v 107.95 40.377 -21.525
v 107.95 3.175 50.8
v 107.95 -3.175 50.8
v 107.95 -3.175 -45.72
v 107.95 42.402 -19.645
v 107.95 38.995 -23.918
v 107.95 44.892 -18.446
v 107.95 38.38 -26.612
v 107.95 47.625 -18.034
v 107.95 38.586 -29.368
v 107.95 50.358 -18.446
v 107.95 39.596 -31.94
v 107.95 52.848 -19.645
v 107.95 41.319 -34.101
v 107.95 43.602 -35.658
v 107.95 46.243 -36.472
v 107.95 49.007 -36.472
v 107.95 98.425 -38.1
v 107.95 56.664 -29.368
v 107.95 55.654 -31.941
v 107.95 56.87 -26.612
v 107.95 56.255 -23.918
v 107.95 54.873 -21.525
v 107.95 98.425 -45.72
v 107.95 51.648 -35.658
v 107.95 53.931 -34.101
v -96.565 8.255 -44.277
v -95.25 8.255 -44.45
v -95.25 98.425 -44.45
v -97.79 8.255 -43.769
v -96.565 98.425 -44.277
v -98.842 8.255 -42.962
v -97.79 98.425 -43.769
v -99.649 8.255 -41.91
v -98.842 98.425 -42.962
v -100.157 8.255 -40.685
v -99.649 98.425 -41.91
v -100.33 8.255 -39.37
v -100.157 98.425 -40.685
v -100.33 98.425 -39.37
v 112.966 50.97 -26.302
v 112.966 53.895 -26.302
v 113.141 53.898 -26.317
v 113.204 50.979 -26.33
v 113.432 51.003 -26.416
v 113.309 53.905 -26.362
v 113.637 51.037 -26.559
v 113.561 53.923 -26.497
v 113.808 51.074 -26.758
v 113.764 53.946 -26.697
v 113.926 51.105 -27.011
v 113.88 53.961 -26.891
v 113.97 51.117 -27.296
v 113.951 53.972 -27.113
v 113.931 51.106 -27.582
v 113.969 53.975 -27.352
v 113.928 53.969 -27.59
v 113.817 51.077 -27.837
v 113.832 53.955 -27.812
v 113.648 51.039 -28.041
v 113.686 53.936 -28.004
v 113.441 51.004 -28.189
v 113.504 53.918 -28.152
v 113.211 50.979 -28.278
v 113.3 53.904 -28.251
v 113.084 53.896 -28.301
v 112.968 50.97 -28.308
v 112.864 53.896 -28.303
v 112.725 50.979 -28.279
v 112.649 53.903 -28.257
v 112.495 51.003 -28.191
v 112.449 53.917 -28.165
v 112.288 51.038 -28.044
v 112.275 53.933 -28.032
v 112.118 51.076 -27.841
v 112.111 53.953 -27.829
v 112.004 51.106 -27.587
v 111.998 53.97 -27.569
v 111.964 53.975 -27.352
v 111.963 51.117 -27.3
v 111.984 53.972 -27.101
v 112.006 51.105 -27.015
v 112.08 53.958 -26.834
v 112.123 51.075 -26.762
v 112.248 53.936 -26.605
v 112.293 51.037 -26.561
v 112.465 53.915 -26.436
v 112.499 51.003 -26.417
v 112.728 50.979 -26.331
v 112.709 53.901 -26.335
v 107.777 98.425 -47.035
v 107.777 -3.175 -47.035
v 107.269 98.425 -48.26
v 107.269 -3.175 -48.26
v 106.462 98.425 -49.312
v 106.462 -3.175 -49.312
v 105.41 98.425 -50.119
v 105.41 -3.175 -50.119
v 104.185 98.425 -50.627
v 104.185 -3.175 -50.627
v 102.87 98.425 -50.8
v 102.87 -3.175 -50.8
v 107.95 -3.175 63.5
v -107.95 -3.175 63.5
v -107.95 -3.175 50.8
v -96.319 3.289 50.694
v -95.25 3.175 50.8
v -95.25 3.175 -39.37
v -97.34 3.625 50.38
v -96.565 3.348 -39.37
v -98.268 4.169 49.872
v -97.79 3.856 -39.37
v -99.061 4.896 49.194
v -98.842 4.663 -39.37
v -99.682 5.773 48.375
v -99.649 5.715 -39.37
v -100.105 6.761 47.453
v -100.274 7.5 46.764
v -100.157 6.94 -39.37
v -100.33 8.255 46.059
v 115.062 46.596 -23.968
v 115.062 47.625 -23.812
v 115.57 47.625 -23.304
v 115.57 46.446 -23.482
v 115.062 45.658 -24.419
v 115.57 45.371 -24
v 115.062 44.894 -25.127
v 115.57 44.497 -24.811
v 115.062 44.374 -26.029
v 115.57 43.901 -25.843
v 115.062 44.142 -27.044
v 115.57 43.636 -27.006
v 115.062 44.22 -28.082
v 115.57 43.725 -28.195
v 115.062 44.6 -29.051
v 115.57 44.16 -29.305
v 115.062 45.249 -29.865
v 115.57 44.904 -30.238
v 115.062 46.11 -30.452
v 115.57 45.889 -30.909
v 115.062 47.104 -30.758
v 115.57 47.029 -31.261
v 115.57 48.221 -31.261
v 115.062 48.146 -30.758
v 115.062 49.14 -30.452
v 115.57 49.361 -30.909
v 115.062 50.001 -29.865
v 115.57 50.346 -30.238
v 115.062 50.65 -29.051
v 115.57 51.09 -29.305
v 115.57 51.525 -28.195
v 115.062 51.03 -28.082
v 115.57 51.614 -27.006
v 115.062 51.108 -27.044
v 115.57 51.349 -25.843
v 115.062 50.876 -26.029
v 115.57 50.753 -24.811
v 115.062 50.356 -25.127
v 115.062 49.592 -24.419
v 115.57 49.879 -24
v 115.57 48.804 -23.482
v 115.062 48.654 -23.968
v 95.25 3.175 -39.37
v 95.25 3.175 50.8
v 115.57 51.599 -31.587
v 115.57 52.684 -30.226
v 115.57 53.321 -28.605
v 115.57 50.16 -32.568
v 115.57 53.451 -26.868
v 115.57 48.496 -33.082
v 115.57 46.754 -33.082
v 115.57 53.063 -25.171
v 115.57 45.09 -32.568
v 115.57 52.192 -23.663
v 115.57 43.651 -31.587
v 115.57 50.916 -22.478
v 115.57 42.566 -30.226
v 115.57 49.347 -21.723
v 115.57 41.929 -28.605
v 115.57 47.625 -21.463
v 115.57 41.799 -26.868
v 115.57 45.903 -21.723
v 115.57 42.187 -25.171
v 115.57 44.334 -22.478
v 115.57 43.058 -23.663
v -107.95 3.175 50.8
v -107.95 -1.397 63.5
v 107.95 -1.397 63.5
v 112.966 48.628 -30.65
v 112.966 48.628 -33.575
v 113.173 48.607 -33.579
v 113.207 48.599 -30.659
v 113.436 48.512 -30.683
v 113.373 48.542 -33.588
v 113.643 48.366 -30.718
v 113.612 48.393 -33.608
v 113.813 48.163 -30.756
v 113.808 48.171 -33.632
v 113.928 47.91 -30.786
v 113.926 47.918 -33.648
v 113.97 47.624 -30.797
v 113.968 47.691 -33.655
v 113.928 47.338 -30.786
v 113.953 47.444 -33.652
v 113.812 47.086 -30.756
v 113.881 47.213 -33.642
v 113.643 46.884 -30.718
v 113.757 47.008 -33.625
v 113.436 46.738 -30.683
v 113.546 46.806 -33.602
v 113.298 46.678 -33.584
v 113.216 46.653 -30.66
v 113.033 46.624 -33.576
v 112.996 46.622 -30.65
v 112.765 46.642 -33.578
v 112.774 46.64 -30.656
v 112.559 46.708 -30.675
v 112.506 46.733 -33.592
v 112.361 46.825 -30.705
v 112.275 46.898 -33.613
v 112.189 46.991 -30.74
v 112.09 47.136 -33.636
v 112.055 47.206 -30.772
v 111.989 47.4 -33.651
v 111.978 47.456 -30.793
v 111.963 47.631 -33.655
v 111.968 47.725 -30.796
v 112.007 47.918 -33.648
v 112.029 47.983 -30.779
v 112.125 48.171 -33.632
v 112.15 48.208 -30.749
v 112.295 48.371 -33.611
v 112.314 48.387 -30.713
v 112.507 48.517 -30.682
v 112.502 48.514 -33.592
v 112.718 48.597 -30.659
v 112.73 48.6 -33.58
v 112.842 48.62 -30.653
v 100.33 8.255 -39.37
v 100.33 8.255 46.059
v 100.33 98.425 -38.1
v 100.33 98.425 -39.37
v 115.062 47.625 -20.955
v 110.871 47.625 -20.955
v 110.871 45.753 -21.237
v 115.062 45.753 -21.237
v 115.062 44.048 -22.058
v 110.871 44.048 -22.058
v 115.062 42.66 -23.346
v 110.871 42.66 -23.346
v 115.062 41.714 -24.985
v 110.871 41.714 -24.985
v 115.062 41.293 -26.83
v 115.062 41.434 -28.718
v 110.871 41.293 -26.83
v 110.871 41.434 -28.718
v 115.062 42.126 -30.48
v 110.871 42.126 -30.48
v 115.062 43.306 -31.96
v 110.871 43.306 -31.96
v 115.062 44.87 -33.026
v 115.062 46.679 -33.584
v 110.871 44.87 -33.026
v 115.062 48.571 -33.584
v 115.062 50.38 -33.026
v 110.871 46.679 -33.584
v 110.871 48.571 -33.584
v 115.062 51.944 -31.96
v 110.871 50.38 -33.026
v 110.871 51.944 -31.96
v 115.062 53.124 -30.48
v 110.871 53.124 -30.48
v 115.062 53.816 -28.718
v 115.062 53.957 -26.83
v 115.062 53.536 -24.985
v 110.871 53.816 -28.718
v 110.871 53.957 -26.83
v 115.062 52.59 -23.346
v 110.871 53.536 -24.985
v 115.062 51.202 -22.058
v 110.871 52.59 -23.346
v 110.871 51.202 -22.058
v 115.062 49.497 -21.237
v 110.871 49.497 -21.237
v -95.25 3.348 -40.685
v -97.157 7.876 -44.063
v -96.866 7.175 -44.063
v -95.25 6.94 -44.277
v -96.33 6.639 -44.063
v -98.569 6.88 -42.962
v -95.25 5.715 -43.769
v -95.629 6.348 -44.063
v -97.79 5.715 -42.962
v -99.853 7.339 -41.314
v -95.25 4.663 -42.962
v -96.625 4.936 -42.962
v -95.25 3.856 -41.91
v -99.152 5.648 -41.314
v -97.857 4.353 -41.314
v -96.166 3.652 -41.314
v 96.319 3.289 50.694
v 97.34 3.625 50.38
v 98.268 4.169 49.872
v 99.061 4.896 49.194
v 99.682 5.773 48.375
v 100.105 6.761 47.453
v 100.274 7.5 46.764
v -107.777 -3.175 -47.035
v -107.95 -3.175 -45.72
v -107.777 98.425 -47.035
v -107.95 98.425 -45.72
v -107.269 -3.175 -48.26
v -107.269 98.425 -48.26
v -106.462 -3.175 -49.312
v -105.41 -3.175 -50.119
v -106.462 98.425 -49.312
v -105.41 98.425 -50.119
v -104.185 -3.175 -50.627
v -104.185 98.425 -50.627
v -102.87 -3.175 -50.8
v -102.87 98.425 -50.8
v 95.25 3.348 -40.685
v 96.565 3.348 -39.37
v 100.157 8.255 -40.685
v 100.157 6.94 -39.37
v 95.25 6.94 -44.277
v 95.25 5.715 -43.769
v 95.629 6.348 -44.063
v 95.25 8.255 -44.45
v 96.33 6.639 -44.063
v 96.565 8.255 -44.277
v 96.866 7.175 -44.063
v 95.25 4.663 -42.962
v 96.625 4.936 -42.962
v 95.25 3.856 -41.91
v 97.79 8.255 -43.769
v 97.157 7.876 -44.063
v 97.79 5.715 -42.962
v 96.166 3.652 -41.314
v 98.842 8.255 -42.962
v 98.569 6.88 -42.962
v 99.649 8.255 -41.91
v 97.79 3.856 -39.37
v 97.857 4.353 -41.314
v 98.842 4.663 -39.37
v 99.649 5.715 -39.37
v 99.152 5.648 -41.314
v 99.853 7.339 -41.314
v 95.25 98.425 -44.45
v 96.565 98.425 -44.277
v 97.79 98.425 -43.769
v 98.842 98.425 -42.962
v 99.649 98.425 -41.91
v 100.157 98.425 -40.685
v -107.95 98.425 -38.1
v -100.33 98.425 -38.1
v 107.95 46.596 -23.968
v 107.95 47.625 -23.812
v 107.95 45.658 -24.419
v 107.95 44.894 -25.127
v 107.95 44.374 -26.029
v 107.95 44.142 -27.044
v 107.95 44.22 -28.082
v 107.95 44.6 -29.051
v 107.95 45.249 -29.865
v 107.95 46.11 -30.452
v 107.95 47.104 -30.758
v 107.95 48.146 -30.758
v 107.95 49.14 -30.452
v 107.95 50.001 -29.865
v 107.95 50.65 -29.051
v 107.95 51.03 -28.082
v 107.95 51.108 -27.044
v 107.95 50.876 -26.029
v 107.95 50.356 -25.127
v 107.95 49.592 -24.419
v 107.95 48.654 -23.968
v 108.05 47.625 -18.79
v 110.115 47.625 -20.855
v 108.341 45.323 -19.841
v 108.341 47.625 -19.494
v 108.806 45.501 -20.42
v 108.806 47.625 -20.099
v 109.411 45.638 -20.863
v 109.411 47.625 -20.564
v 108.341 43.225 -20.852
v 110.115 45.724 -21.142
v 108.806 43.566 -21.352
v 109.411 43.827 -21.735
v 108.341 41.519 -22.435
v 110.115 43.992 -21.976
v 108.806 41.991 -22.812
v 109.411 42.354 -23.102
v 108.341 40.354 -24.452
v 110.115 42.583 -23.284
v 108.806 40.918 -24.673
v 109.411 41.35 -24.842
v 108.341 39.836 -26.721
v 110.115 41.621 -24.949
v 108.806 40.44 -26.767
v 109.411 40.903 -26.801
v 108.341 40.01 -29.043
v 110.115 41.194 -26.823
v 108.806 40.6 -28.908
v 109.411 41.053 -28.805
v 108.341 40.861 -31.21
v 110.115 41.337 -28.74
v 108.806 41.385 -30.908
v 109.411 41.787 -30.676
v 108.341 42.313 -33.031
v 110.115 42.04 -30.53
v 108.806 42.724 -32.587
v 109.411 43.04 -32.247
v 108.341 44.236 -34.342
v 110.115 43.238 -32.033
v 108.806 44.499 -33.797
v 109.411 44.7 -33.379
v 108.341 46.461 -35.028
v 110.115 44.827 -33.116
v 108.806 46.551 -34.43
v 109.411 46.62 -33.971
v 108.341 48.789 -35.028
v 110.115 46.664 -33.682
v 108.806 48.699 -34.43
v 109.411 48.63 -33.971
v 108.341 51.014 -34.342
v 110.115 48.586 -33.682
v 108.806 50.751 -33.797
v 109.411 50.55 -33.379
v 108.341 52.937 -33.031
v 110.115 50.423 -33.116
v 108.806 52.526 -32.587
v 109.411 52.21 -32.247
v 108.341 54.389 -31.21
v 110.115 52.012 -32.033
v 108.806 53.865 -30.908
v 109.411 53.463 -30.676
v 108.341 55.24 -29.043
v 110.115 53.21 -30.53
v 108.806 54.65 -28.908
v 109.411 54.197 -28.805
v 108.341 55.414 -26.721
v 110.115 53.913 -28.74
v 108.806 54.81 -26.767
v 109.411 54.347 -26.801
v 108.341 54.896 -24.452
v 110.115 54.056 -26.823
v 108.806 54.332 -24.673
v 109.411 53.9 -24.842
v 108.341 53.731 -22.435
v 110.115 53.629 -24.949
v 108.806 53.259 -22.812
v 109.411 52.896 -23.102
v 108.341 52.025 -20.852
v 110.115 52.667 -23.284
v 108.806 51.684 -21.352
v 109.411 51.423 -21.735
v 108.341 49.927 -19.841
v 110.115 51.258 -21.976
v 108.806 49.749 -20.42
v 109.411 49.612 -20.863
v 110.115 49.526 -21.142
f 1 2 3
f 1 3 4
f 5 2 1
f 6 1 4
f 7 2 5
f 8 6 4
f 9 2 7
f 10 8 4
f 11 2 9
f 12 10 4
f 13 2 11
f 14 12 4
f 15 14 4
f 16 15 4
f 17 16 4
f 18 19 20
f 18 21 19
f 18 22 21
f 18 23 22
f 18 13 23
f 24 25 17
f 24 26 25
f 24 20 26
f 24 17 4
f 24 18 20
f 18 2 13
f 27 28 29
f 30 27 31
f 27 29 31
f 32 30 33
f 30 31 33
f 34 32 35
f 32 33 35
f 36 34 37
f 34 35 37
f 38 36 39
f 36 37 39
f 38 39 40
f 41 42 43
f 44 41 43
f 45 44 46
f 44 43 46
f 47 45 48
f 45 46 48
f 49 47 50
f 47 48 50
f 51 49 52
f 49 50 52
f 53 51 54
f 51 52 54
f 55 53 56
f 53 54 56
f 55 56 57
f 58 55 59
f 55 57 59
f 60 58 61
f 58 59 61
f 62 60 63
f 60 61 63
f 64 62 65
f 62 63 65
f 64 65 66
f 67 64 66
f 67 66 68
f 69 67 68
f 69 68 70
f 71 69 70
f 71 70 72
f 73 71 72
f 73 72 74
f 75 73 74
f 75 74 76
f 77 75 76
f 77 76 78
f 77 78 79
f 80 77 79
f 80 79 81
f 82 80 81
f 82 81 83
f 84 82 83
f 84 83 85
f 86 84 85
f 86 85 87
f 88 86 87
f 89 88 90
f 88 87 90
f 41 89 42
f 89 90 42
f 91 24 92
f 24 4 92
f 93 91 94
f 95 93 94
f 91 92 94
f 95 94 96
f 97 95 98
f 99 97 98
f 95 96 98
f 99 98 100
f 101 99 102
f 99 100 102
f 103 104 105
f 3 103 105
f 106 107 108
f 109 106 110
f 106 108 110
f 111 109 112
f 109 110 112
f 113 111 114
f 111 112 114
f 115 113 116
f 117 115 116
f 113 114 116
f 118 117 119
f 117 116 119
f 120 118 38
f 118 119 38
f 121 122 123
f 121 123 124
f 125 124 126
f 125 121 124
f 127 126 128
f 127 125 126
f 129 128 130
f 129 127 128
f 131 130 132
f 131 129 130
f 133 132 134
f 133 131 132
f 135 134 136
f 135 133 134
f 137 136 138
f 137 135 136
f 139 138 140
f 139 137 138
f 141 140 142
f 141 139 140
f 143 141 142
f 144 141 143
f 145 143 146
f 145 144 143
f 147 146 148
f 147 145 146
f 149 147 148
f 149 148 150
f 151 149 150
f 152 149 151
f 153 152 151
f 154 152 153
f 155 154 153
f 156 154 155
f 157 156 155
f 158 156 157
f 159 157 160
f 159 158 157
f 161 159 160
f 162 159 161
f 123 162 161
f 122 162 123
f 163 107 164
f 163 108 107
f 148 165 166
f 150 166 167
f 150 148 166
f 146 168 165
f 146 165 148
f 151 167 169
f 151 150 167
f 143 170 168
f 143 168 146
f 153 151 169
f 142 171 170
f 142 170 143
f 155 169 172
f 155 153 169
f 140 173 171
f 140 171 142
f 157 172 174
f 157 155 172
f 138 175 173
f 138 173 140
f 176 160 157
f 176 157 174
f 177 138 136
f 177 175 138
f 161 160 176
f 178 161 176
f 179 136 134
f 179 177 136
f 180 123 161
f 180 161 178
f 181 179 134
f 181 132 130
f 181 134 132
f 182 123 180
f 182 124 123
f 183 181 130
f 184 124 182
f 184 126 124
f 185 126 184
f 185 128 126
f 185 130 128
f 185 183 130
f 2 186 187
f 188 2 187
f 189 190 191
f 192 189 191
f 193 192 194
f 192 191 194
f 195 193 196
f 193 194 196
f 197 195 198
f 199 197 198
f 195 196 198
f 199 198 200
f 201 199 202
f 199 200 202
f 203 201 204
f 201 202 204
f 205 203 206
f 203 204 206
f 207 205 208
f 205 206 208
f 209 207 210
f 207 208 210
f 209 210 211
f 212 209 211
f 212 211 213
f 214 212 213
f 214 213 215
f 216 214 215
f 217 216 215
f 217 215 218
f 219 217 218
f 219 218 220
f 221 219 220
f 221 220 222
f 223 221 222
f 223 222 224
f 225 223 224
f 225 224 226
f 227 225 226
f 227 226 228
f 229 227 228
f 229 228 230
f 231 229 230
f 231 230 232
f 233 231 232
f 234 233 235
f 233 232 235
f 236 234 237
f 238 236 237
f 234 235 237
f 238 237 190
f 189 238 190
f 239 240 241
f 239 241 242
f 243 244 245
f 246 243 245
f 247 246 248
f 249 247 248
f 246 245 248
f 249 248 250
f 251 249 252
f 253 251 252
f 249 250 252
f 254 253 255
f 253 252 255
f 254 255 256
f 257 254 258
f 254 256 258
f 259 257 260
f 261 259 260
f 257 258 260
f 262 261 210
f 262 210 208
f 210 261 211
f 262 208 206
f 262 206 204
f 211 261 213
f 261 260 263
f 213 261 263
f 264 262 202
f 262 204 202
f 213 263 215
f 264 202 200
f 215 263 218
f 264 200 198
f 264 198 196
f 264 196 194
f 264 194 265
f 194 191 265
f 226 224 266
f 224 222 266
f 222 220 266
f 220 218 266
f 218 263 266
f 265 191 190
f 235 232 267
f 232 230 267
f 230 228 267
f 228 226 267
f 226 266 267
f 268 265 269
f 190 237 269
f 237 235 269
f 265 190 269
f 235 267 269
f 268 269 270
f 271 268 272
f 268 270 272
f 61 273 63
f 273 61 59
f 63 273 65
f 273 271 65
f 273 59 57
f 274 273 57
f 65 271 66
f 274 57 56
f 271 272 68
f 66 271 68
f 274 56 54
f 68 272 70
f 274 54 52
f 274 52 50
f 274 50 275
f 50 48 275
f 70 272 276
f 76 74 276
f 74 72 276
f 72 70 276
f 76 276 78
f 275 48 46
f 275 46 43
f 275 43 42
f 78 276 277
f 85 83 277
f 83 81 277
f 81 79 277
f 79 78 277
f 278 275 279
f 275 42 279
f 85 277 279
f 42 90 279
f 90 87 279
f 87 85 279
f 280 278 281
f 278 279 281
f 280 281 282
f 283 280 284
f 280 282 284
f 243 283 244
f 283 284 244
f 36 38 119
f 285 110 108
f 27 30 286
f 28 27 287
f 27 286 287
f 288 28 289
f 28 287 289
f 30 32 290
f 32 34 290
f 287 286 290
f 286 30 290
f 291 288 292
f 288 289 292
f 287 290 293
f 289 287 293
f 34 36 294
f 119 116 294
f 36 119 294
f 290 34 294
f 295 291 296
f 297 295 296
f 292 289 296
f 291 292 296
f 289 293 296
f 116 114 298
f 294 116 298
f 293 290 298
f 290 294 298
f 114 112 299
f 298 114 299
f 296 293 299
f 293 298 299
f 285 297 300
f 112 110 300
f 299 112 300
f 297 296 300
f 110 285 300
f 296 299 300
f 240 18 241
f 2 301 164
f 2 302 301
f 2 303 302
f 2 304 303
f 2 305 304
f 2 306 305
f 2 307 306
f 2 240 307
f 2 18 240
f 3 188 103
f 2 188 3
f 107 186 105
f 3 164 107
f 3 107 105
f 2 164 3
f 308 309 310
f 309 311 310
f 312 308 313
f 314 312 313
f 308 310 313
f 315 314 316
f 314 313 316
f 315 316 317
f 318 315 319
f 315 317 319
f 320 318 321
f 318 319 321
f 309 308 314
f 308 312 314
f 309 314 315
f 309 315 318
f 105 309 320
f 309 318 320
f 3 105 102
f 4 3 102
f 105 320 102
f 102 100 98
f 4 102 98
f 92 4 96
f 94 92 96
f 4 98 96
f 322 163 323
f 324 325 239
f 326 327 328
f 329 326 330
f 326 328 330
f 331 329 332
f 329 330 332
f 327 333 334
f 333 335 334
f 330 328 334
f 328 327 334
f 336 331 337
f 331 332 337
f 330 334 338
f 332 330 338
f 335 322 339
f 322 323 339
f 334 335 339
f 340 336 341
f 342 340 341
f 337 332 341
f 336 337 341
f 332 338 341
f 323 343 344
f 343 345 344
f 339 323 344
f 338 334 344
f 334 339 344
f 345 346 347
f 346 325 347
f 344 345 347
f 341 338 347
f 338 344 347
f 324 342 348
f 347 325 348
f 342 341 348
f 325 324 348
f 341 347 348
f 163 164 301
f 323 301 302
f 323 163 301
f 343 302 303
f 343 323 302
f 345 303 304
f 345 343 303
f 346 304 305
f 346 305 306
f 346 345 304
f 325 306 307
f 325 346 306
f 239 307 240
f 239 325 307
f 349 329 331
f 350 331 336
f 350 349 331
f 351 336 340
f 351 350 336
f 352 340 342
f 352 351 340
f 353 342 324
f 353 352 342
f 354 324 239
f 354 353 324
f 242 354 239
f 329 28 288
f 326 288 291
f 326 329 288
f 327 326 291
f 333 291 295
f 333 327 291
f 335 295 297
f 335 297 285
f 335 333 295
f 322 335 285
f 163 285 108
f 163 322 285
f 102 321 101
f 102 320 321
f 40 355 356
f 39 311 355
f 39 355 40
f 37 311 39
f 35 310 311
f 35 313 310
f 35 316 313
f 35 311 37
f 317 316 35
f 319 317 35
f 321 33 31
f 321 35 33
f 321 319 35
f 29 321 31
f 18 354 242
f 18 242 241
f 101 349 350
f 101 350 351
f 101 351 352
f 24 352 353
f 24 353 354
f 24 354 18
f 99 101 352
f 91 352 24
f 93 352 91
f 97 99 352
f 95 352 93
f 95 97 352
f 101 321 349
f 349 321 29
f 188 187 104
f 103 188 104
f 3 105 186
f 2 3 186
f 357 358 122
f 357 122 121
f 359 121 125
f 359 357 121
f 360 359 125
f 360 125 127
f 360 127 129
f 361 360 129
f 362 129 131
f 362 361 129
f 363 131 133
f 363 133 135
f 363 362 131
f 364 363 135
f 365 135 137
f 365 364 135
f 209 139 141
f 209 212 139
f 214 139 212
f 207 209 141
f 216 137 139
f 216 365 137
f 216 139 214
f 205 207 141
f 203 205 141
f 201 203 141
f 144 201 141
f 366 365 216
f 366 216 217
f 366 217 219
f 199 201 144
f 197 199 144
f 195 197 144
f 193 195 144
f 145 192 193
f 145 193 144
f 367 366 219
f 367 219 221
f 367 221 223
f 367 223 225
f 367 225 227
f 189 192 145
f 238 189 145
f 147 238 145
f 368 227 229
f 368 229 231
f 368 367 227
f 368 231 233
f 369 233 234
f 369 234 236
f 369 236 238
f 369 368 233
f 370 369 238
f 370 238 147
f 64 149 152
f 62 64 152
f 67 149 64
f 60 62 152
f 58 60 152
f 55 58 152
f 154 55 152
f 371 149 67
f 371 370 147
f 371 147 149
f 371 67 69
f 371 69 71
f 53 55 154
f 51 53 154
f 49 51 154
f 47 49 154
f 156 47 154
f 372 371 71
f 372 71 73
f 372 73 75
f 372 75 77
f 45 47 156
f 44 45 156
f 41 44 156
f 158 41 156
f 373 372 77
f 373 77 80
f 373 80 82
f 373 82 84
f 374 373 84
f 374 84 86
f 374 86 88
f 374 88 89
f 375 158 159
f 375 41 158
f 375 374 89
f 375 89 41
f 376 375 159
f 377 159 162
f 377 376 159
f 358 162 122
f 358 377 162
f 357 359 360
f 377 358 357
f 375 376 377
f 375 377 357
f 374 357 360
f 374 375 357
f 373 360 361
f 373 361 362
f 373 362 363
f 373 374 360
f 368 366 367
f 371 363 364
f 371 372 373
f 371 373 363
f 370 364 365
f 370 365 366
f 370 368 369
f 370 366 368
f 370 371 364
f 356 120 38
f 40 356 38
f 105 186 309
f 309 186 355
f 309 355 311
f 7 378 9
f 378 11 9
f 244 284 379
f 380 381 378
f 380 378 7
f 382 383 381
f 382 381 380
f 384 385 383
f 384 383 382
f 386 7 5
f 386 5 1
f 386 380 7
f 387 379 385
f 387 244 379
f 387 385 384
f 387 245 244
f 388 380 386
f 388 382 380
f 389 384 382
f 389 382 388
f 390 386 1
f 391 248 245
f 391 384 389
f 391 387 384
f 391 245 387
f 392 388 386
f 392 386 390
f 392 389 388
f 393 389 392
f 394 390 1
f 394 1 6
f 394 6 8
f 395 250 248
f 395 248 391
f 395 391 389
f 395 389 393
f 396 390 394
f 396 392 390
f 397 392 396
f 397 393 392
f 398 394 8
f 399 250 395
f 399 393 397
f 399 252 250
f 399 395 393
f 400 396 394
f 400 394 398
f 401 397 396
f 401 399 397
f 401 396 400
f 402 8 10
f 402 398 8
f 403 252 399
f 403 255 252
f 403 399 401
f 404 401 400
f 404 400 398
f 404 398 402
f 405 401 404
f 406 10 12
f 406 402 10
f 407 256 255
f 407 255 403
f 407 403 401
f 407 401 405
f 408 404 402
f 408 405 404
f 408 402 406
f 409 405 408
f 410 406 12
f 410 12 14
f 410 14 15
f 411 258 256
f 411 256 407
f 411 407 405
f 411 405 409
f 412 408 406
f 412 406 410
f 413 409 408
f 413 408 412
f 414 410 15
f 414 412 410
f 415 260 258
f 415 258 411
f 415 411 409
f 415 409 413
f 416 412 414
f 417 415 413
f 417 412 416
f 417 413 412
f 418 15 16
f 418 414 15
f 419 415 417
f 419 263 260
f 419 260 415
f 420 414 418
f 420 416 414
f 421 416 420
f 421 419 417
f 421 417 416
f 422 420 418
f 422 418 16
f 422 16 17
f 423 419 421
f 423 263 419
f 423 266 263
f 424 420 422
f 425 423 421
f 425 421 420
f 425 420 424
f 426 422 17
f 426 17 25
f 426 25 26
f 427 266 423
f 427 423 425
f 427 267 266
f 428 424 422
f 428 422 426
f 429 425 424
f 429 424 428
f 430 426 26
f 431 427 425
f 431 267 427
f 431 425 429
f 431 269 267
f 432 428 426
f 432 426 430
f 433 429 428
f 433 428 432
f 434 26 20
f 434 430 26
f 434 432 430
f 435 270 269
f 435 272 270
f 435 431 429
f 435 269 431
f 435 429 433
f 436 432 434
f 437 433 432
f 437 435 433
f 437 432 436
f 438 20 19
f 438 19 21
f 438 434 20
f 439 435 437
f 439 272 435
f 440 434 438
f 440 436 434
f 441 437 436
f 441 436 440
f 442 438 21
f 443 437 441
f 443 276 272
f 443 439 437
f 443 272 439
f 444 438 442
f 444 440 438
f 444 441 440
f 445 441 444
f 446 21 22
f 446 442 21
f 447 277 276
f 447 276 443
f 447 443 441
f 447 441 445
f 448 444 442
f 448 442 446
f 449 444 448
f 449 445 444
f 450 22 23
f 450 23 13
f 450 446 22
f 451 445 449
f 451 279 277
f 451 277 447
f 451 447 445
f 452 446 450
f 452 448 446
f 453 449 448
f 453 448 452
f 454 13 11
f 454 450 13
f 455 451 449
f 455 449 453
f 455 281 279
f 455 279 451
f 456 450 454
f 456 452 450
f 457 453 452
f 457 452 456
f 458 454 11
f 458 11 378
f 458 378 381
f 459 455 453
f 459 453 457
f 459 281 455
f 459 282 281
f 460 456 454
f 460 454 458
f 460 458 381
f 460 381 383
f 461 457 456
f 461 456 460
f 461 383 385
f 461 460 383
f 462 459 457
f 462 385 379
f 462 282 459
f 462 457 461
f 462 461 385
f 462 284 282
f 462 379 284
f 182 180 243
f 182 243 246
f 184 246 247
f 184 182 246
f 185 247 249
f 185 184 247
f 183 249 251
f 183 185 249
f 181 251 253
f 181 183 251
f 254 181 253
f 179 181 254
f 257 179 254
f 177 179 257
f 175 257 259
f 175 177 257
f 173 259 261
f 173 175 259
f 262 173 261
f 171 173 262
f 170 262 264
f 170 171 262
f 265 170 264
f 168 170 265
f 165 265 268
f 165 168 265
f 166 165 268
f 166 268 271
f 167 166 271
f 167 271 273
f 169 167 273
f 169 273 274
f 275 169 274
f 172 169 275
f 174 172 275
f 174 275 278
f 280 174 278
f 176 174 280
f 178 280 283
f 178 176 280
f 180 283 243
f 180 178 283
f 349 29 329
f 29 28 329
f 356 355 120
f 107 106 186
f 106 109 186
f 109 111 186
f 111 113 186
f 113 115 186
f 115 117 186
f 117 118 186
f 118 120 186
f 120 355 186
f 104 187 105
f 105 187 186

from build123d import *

# Parameters (mm, degrees)
SKETCH1_W           = 215.9
SKETCH1_H           = 101.6
BOSS_EXTRUDE1_DEPTH = 3.175
BOSS_EXTRUDE2_DEPTH = 7.62
SKETCH4_W           = 200.66
SKETCH4_H           = 6.35
BOSS_EXTRUDE3_DEPTH = 95.25
BOSS_EXTRUDE4_DEPTH = 215.9
FILLET2_R           = 5.08
FILLET3_R           = 5.08
SKETCH6_R           = 6.35
SKETCH6_R_2         = 3.4925
BOSS_EXTRUDE5_DEPTH = 7.62
FILLET4_R           = 2.921
CHAMFER1_SIZE       = 0.508
SKETCH7_R           = 1.0033
CUT_EXTRUDE1_DEPTH  = 3.81
CIRPATTERN1_COUNT   = 2
CIRPATTERN1_ANGLE   = 90


with BuildPart() as part:
    # Sketch1 → Boss-Extrude1 (new, symmetric)
    with BuildSketch(Plane(origin=(0, 0, 0), x_dir=(1, 0, 0), z_dir=(0, 1, 0))):
        Rectangle(SKETCH1_W, SKETCH1_H)
    extrude(amount=BOSS_EXTRUDE1_DEPTH, both=True)

    # Sketch3 → Boss-Extrude2 (add)
    with BuildSketch(Plane.ZY.offset(107.95)):
        Polygon((-50.8, 3.175), (-50.8, 98.425), (-38.1, 98.425), (50.8, 3.175), align=None)
    boss_extrude2 = extrude(amount=-BOSS_EXTRUDE2_DEPTH)

    # Mirror1: Boss-Extrude2 across plane
    add(boss_extrude2.mirror(Plane(origin=(0, 0, 0), x_dir=(0, 0, 1), z_dir=(1, 0, 0))))

    # Sketch4 → Boss-Extrude3 (add)
    with BuildSketch(Plane(origin=(0, 3.175, 0), x_dir=(1, 0, 0), z_dir=(0, 1, 0))):
        with Locations((0, 47.625)):
            Rectangle(SKETCH4_W, SKETCH4_H)
    extrude(amount=BOSS_EXTRUDE3_DEPTH)

    # Fillet2
    fillet2_edges = [part.edges().sort_by_distance(p)[0] for p in [
        (100.33, 3.175, 3.175),
        (-100.33, 3.175, 3.175),
        (-100.33, 50.8, -44.45),
        (0, 3.175, -44.45),
        (100.33, 50.8, -44.45),
    ]]
    fillet(fillet2_edges, radius=FILLET2_R)

    # Fillet3
    fillet3_edges = [part.edges().sort_by_distance(p)[0] for p in [
        (-107.95, 47.625, -50.8),
        (107.95, 47.625, -50.8),
    ]]
    fillet(fillet3_edges, radius=FILLET3_R)

    # Sketch6 → Boss-Extrude5 (add)
    with BuildSketch(Plane(origin=(107.95, 0, 0), x_dir=(0, 0, -1), z_dir=(1, 0, 0))):
        with Locations(Location((27.305, 47.625, 0), (0, 0, 180))):
            Circle(SKETCH6_R)
        with Locations(Location((27.305, 47.625, 0), (0, 0, 180))):
            Circle(SKETCH6_R_2, mode=Mode.SUBTRACT)
    extrude(amount=BOSS_EXTRUDE5_DEPTH)

    # Fillet4
    fillet4_edges = [part.edges().sort_by_distance(p)[0] for p in [
        (107.95, 47.625, -33.655),
    ]]
    fillet(fillet4_edges, radius=FILLET4_R)

    # Chamfer1
    chamfer1_edges = [part.edges().sort_by_distance(p)[0] for p in [
        (115.57, 47.625, -33.655),
        (115.57, 47.625, -30.7975),
    ]]
    chamfer(chamfer1_edges, length=CHAMFER1_SIZE)

    # Sketch7 → Cut-Extrude1 (cut)
    with BuildSketch(Plane(origin=(0, 53.975, 0), x_dir=(1, 0, 0), z_dir=(0, 1, 0))):
        with Locations(Location((112.9665, 27.305, 0), (0, 0, 270))):
            Circle(SKETCH7_R)
    cut_extrude1 = extrude(amount=-CUT_EXTRUDE1_DEPTH, mode=Mode.SUBTRACT)

    # CirPattern1: Cut-Extrude1 ×2 about axis
    cirpattern1_axis = Axis((115.57, 47.625, -27.305), (-1, 0, 0))
    for i in range(1, CIRPATTERN1_COUNT):
        add(cut_extrude1.rotate(cirpattern1_axis, i * CIRPATTERN1_ANGLE / (CIRPATTERN1_COUNT - 1)), mode=Mode.SUBTRACT)


with BuildPart() as body_2:
    # Sketch5 → Boss-Extrude4 (new body)
    with BuildSketch(Plane.ZY.offset(107.95)):
        Polygon((63.5, -3.175), (50.8, -3.175), (50.8, 3.175), (63.5, -1.397), align=None)
    extrude(amount=-BOSS_EXTRUDE4_DEPTH)


solid = Compound([part.part, body_2.part])
